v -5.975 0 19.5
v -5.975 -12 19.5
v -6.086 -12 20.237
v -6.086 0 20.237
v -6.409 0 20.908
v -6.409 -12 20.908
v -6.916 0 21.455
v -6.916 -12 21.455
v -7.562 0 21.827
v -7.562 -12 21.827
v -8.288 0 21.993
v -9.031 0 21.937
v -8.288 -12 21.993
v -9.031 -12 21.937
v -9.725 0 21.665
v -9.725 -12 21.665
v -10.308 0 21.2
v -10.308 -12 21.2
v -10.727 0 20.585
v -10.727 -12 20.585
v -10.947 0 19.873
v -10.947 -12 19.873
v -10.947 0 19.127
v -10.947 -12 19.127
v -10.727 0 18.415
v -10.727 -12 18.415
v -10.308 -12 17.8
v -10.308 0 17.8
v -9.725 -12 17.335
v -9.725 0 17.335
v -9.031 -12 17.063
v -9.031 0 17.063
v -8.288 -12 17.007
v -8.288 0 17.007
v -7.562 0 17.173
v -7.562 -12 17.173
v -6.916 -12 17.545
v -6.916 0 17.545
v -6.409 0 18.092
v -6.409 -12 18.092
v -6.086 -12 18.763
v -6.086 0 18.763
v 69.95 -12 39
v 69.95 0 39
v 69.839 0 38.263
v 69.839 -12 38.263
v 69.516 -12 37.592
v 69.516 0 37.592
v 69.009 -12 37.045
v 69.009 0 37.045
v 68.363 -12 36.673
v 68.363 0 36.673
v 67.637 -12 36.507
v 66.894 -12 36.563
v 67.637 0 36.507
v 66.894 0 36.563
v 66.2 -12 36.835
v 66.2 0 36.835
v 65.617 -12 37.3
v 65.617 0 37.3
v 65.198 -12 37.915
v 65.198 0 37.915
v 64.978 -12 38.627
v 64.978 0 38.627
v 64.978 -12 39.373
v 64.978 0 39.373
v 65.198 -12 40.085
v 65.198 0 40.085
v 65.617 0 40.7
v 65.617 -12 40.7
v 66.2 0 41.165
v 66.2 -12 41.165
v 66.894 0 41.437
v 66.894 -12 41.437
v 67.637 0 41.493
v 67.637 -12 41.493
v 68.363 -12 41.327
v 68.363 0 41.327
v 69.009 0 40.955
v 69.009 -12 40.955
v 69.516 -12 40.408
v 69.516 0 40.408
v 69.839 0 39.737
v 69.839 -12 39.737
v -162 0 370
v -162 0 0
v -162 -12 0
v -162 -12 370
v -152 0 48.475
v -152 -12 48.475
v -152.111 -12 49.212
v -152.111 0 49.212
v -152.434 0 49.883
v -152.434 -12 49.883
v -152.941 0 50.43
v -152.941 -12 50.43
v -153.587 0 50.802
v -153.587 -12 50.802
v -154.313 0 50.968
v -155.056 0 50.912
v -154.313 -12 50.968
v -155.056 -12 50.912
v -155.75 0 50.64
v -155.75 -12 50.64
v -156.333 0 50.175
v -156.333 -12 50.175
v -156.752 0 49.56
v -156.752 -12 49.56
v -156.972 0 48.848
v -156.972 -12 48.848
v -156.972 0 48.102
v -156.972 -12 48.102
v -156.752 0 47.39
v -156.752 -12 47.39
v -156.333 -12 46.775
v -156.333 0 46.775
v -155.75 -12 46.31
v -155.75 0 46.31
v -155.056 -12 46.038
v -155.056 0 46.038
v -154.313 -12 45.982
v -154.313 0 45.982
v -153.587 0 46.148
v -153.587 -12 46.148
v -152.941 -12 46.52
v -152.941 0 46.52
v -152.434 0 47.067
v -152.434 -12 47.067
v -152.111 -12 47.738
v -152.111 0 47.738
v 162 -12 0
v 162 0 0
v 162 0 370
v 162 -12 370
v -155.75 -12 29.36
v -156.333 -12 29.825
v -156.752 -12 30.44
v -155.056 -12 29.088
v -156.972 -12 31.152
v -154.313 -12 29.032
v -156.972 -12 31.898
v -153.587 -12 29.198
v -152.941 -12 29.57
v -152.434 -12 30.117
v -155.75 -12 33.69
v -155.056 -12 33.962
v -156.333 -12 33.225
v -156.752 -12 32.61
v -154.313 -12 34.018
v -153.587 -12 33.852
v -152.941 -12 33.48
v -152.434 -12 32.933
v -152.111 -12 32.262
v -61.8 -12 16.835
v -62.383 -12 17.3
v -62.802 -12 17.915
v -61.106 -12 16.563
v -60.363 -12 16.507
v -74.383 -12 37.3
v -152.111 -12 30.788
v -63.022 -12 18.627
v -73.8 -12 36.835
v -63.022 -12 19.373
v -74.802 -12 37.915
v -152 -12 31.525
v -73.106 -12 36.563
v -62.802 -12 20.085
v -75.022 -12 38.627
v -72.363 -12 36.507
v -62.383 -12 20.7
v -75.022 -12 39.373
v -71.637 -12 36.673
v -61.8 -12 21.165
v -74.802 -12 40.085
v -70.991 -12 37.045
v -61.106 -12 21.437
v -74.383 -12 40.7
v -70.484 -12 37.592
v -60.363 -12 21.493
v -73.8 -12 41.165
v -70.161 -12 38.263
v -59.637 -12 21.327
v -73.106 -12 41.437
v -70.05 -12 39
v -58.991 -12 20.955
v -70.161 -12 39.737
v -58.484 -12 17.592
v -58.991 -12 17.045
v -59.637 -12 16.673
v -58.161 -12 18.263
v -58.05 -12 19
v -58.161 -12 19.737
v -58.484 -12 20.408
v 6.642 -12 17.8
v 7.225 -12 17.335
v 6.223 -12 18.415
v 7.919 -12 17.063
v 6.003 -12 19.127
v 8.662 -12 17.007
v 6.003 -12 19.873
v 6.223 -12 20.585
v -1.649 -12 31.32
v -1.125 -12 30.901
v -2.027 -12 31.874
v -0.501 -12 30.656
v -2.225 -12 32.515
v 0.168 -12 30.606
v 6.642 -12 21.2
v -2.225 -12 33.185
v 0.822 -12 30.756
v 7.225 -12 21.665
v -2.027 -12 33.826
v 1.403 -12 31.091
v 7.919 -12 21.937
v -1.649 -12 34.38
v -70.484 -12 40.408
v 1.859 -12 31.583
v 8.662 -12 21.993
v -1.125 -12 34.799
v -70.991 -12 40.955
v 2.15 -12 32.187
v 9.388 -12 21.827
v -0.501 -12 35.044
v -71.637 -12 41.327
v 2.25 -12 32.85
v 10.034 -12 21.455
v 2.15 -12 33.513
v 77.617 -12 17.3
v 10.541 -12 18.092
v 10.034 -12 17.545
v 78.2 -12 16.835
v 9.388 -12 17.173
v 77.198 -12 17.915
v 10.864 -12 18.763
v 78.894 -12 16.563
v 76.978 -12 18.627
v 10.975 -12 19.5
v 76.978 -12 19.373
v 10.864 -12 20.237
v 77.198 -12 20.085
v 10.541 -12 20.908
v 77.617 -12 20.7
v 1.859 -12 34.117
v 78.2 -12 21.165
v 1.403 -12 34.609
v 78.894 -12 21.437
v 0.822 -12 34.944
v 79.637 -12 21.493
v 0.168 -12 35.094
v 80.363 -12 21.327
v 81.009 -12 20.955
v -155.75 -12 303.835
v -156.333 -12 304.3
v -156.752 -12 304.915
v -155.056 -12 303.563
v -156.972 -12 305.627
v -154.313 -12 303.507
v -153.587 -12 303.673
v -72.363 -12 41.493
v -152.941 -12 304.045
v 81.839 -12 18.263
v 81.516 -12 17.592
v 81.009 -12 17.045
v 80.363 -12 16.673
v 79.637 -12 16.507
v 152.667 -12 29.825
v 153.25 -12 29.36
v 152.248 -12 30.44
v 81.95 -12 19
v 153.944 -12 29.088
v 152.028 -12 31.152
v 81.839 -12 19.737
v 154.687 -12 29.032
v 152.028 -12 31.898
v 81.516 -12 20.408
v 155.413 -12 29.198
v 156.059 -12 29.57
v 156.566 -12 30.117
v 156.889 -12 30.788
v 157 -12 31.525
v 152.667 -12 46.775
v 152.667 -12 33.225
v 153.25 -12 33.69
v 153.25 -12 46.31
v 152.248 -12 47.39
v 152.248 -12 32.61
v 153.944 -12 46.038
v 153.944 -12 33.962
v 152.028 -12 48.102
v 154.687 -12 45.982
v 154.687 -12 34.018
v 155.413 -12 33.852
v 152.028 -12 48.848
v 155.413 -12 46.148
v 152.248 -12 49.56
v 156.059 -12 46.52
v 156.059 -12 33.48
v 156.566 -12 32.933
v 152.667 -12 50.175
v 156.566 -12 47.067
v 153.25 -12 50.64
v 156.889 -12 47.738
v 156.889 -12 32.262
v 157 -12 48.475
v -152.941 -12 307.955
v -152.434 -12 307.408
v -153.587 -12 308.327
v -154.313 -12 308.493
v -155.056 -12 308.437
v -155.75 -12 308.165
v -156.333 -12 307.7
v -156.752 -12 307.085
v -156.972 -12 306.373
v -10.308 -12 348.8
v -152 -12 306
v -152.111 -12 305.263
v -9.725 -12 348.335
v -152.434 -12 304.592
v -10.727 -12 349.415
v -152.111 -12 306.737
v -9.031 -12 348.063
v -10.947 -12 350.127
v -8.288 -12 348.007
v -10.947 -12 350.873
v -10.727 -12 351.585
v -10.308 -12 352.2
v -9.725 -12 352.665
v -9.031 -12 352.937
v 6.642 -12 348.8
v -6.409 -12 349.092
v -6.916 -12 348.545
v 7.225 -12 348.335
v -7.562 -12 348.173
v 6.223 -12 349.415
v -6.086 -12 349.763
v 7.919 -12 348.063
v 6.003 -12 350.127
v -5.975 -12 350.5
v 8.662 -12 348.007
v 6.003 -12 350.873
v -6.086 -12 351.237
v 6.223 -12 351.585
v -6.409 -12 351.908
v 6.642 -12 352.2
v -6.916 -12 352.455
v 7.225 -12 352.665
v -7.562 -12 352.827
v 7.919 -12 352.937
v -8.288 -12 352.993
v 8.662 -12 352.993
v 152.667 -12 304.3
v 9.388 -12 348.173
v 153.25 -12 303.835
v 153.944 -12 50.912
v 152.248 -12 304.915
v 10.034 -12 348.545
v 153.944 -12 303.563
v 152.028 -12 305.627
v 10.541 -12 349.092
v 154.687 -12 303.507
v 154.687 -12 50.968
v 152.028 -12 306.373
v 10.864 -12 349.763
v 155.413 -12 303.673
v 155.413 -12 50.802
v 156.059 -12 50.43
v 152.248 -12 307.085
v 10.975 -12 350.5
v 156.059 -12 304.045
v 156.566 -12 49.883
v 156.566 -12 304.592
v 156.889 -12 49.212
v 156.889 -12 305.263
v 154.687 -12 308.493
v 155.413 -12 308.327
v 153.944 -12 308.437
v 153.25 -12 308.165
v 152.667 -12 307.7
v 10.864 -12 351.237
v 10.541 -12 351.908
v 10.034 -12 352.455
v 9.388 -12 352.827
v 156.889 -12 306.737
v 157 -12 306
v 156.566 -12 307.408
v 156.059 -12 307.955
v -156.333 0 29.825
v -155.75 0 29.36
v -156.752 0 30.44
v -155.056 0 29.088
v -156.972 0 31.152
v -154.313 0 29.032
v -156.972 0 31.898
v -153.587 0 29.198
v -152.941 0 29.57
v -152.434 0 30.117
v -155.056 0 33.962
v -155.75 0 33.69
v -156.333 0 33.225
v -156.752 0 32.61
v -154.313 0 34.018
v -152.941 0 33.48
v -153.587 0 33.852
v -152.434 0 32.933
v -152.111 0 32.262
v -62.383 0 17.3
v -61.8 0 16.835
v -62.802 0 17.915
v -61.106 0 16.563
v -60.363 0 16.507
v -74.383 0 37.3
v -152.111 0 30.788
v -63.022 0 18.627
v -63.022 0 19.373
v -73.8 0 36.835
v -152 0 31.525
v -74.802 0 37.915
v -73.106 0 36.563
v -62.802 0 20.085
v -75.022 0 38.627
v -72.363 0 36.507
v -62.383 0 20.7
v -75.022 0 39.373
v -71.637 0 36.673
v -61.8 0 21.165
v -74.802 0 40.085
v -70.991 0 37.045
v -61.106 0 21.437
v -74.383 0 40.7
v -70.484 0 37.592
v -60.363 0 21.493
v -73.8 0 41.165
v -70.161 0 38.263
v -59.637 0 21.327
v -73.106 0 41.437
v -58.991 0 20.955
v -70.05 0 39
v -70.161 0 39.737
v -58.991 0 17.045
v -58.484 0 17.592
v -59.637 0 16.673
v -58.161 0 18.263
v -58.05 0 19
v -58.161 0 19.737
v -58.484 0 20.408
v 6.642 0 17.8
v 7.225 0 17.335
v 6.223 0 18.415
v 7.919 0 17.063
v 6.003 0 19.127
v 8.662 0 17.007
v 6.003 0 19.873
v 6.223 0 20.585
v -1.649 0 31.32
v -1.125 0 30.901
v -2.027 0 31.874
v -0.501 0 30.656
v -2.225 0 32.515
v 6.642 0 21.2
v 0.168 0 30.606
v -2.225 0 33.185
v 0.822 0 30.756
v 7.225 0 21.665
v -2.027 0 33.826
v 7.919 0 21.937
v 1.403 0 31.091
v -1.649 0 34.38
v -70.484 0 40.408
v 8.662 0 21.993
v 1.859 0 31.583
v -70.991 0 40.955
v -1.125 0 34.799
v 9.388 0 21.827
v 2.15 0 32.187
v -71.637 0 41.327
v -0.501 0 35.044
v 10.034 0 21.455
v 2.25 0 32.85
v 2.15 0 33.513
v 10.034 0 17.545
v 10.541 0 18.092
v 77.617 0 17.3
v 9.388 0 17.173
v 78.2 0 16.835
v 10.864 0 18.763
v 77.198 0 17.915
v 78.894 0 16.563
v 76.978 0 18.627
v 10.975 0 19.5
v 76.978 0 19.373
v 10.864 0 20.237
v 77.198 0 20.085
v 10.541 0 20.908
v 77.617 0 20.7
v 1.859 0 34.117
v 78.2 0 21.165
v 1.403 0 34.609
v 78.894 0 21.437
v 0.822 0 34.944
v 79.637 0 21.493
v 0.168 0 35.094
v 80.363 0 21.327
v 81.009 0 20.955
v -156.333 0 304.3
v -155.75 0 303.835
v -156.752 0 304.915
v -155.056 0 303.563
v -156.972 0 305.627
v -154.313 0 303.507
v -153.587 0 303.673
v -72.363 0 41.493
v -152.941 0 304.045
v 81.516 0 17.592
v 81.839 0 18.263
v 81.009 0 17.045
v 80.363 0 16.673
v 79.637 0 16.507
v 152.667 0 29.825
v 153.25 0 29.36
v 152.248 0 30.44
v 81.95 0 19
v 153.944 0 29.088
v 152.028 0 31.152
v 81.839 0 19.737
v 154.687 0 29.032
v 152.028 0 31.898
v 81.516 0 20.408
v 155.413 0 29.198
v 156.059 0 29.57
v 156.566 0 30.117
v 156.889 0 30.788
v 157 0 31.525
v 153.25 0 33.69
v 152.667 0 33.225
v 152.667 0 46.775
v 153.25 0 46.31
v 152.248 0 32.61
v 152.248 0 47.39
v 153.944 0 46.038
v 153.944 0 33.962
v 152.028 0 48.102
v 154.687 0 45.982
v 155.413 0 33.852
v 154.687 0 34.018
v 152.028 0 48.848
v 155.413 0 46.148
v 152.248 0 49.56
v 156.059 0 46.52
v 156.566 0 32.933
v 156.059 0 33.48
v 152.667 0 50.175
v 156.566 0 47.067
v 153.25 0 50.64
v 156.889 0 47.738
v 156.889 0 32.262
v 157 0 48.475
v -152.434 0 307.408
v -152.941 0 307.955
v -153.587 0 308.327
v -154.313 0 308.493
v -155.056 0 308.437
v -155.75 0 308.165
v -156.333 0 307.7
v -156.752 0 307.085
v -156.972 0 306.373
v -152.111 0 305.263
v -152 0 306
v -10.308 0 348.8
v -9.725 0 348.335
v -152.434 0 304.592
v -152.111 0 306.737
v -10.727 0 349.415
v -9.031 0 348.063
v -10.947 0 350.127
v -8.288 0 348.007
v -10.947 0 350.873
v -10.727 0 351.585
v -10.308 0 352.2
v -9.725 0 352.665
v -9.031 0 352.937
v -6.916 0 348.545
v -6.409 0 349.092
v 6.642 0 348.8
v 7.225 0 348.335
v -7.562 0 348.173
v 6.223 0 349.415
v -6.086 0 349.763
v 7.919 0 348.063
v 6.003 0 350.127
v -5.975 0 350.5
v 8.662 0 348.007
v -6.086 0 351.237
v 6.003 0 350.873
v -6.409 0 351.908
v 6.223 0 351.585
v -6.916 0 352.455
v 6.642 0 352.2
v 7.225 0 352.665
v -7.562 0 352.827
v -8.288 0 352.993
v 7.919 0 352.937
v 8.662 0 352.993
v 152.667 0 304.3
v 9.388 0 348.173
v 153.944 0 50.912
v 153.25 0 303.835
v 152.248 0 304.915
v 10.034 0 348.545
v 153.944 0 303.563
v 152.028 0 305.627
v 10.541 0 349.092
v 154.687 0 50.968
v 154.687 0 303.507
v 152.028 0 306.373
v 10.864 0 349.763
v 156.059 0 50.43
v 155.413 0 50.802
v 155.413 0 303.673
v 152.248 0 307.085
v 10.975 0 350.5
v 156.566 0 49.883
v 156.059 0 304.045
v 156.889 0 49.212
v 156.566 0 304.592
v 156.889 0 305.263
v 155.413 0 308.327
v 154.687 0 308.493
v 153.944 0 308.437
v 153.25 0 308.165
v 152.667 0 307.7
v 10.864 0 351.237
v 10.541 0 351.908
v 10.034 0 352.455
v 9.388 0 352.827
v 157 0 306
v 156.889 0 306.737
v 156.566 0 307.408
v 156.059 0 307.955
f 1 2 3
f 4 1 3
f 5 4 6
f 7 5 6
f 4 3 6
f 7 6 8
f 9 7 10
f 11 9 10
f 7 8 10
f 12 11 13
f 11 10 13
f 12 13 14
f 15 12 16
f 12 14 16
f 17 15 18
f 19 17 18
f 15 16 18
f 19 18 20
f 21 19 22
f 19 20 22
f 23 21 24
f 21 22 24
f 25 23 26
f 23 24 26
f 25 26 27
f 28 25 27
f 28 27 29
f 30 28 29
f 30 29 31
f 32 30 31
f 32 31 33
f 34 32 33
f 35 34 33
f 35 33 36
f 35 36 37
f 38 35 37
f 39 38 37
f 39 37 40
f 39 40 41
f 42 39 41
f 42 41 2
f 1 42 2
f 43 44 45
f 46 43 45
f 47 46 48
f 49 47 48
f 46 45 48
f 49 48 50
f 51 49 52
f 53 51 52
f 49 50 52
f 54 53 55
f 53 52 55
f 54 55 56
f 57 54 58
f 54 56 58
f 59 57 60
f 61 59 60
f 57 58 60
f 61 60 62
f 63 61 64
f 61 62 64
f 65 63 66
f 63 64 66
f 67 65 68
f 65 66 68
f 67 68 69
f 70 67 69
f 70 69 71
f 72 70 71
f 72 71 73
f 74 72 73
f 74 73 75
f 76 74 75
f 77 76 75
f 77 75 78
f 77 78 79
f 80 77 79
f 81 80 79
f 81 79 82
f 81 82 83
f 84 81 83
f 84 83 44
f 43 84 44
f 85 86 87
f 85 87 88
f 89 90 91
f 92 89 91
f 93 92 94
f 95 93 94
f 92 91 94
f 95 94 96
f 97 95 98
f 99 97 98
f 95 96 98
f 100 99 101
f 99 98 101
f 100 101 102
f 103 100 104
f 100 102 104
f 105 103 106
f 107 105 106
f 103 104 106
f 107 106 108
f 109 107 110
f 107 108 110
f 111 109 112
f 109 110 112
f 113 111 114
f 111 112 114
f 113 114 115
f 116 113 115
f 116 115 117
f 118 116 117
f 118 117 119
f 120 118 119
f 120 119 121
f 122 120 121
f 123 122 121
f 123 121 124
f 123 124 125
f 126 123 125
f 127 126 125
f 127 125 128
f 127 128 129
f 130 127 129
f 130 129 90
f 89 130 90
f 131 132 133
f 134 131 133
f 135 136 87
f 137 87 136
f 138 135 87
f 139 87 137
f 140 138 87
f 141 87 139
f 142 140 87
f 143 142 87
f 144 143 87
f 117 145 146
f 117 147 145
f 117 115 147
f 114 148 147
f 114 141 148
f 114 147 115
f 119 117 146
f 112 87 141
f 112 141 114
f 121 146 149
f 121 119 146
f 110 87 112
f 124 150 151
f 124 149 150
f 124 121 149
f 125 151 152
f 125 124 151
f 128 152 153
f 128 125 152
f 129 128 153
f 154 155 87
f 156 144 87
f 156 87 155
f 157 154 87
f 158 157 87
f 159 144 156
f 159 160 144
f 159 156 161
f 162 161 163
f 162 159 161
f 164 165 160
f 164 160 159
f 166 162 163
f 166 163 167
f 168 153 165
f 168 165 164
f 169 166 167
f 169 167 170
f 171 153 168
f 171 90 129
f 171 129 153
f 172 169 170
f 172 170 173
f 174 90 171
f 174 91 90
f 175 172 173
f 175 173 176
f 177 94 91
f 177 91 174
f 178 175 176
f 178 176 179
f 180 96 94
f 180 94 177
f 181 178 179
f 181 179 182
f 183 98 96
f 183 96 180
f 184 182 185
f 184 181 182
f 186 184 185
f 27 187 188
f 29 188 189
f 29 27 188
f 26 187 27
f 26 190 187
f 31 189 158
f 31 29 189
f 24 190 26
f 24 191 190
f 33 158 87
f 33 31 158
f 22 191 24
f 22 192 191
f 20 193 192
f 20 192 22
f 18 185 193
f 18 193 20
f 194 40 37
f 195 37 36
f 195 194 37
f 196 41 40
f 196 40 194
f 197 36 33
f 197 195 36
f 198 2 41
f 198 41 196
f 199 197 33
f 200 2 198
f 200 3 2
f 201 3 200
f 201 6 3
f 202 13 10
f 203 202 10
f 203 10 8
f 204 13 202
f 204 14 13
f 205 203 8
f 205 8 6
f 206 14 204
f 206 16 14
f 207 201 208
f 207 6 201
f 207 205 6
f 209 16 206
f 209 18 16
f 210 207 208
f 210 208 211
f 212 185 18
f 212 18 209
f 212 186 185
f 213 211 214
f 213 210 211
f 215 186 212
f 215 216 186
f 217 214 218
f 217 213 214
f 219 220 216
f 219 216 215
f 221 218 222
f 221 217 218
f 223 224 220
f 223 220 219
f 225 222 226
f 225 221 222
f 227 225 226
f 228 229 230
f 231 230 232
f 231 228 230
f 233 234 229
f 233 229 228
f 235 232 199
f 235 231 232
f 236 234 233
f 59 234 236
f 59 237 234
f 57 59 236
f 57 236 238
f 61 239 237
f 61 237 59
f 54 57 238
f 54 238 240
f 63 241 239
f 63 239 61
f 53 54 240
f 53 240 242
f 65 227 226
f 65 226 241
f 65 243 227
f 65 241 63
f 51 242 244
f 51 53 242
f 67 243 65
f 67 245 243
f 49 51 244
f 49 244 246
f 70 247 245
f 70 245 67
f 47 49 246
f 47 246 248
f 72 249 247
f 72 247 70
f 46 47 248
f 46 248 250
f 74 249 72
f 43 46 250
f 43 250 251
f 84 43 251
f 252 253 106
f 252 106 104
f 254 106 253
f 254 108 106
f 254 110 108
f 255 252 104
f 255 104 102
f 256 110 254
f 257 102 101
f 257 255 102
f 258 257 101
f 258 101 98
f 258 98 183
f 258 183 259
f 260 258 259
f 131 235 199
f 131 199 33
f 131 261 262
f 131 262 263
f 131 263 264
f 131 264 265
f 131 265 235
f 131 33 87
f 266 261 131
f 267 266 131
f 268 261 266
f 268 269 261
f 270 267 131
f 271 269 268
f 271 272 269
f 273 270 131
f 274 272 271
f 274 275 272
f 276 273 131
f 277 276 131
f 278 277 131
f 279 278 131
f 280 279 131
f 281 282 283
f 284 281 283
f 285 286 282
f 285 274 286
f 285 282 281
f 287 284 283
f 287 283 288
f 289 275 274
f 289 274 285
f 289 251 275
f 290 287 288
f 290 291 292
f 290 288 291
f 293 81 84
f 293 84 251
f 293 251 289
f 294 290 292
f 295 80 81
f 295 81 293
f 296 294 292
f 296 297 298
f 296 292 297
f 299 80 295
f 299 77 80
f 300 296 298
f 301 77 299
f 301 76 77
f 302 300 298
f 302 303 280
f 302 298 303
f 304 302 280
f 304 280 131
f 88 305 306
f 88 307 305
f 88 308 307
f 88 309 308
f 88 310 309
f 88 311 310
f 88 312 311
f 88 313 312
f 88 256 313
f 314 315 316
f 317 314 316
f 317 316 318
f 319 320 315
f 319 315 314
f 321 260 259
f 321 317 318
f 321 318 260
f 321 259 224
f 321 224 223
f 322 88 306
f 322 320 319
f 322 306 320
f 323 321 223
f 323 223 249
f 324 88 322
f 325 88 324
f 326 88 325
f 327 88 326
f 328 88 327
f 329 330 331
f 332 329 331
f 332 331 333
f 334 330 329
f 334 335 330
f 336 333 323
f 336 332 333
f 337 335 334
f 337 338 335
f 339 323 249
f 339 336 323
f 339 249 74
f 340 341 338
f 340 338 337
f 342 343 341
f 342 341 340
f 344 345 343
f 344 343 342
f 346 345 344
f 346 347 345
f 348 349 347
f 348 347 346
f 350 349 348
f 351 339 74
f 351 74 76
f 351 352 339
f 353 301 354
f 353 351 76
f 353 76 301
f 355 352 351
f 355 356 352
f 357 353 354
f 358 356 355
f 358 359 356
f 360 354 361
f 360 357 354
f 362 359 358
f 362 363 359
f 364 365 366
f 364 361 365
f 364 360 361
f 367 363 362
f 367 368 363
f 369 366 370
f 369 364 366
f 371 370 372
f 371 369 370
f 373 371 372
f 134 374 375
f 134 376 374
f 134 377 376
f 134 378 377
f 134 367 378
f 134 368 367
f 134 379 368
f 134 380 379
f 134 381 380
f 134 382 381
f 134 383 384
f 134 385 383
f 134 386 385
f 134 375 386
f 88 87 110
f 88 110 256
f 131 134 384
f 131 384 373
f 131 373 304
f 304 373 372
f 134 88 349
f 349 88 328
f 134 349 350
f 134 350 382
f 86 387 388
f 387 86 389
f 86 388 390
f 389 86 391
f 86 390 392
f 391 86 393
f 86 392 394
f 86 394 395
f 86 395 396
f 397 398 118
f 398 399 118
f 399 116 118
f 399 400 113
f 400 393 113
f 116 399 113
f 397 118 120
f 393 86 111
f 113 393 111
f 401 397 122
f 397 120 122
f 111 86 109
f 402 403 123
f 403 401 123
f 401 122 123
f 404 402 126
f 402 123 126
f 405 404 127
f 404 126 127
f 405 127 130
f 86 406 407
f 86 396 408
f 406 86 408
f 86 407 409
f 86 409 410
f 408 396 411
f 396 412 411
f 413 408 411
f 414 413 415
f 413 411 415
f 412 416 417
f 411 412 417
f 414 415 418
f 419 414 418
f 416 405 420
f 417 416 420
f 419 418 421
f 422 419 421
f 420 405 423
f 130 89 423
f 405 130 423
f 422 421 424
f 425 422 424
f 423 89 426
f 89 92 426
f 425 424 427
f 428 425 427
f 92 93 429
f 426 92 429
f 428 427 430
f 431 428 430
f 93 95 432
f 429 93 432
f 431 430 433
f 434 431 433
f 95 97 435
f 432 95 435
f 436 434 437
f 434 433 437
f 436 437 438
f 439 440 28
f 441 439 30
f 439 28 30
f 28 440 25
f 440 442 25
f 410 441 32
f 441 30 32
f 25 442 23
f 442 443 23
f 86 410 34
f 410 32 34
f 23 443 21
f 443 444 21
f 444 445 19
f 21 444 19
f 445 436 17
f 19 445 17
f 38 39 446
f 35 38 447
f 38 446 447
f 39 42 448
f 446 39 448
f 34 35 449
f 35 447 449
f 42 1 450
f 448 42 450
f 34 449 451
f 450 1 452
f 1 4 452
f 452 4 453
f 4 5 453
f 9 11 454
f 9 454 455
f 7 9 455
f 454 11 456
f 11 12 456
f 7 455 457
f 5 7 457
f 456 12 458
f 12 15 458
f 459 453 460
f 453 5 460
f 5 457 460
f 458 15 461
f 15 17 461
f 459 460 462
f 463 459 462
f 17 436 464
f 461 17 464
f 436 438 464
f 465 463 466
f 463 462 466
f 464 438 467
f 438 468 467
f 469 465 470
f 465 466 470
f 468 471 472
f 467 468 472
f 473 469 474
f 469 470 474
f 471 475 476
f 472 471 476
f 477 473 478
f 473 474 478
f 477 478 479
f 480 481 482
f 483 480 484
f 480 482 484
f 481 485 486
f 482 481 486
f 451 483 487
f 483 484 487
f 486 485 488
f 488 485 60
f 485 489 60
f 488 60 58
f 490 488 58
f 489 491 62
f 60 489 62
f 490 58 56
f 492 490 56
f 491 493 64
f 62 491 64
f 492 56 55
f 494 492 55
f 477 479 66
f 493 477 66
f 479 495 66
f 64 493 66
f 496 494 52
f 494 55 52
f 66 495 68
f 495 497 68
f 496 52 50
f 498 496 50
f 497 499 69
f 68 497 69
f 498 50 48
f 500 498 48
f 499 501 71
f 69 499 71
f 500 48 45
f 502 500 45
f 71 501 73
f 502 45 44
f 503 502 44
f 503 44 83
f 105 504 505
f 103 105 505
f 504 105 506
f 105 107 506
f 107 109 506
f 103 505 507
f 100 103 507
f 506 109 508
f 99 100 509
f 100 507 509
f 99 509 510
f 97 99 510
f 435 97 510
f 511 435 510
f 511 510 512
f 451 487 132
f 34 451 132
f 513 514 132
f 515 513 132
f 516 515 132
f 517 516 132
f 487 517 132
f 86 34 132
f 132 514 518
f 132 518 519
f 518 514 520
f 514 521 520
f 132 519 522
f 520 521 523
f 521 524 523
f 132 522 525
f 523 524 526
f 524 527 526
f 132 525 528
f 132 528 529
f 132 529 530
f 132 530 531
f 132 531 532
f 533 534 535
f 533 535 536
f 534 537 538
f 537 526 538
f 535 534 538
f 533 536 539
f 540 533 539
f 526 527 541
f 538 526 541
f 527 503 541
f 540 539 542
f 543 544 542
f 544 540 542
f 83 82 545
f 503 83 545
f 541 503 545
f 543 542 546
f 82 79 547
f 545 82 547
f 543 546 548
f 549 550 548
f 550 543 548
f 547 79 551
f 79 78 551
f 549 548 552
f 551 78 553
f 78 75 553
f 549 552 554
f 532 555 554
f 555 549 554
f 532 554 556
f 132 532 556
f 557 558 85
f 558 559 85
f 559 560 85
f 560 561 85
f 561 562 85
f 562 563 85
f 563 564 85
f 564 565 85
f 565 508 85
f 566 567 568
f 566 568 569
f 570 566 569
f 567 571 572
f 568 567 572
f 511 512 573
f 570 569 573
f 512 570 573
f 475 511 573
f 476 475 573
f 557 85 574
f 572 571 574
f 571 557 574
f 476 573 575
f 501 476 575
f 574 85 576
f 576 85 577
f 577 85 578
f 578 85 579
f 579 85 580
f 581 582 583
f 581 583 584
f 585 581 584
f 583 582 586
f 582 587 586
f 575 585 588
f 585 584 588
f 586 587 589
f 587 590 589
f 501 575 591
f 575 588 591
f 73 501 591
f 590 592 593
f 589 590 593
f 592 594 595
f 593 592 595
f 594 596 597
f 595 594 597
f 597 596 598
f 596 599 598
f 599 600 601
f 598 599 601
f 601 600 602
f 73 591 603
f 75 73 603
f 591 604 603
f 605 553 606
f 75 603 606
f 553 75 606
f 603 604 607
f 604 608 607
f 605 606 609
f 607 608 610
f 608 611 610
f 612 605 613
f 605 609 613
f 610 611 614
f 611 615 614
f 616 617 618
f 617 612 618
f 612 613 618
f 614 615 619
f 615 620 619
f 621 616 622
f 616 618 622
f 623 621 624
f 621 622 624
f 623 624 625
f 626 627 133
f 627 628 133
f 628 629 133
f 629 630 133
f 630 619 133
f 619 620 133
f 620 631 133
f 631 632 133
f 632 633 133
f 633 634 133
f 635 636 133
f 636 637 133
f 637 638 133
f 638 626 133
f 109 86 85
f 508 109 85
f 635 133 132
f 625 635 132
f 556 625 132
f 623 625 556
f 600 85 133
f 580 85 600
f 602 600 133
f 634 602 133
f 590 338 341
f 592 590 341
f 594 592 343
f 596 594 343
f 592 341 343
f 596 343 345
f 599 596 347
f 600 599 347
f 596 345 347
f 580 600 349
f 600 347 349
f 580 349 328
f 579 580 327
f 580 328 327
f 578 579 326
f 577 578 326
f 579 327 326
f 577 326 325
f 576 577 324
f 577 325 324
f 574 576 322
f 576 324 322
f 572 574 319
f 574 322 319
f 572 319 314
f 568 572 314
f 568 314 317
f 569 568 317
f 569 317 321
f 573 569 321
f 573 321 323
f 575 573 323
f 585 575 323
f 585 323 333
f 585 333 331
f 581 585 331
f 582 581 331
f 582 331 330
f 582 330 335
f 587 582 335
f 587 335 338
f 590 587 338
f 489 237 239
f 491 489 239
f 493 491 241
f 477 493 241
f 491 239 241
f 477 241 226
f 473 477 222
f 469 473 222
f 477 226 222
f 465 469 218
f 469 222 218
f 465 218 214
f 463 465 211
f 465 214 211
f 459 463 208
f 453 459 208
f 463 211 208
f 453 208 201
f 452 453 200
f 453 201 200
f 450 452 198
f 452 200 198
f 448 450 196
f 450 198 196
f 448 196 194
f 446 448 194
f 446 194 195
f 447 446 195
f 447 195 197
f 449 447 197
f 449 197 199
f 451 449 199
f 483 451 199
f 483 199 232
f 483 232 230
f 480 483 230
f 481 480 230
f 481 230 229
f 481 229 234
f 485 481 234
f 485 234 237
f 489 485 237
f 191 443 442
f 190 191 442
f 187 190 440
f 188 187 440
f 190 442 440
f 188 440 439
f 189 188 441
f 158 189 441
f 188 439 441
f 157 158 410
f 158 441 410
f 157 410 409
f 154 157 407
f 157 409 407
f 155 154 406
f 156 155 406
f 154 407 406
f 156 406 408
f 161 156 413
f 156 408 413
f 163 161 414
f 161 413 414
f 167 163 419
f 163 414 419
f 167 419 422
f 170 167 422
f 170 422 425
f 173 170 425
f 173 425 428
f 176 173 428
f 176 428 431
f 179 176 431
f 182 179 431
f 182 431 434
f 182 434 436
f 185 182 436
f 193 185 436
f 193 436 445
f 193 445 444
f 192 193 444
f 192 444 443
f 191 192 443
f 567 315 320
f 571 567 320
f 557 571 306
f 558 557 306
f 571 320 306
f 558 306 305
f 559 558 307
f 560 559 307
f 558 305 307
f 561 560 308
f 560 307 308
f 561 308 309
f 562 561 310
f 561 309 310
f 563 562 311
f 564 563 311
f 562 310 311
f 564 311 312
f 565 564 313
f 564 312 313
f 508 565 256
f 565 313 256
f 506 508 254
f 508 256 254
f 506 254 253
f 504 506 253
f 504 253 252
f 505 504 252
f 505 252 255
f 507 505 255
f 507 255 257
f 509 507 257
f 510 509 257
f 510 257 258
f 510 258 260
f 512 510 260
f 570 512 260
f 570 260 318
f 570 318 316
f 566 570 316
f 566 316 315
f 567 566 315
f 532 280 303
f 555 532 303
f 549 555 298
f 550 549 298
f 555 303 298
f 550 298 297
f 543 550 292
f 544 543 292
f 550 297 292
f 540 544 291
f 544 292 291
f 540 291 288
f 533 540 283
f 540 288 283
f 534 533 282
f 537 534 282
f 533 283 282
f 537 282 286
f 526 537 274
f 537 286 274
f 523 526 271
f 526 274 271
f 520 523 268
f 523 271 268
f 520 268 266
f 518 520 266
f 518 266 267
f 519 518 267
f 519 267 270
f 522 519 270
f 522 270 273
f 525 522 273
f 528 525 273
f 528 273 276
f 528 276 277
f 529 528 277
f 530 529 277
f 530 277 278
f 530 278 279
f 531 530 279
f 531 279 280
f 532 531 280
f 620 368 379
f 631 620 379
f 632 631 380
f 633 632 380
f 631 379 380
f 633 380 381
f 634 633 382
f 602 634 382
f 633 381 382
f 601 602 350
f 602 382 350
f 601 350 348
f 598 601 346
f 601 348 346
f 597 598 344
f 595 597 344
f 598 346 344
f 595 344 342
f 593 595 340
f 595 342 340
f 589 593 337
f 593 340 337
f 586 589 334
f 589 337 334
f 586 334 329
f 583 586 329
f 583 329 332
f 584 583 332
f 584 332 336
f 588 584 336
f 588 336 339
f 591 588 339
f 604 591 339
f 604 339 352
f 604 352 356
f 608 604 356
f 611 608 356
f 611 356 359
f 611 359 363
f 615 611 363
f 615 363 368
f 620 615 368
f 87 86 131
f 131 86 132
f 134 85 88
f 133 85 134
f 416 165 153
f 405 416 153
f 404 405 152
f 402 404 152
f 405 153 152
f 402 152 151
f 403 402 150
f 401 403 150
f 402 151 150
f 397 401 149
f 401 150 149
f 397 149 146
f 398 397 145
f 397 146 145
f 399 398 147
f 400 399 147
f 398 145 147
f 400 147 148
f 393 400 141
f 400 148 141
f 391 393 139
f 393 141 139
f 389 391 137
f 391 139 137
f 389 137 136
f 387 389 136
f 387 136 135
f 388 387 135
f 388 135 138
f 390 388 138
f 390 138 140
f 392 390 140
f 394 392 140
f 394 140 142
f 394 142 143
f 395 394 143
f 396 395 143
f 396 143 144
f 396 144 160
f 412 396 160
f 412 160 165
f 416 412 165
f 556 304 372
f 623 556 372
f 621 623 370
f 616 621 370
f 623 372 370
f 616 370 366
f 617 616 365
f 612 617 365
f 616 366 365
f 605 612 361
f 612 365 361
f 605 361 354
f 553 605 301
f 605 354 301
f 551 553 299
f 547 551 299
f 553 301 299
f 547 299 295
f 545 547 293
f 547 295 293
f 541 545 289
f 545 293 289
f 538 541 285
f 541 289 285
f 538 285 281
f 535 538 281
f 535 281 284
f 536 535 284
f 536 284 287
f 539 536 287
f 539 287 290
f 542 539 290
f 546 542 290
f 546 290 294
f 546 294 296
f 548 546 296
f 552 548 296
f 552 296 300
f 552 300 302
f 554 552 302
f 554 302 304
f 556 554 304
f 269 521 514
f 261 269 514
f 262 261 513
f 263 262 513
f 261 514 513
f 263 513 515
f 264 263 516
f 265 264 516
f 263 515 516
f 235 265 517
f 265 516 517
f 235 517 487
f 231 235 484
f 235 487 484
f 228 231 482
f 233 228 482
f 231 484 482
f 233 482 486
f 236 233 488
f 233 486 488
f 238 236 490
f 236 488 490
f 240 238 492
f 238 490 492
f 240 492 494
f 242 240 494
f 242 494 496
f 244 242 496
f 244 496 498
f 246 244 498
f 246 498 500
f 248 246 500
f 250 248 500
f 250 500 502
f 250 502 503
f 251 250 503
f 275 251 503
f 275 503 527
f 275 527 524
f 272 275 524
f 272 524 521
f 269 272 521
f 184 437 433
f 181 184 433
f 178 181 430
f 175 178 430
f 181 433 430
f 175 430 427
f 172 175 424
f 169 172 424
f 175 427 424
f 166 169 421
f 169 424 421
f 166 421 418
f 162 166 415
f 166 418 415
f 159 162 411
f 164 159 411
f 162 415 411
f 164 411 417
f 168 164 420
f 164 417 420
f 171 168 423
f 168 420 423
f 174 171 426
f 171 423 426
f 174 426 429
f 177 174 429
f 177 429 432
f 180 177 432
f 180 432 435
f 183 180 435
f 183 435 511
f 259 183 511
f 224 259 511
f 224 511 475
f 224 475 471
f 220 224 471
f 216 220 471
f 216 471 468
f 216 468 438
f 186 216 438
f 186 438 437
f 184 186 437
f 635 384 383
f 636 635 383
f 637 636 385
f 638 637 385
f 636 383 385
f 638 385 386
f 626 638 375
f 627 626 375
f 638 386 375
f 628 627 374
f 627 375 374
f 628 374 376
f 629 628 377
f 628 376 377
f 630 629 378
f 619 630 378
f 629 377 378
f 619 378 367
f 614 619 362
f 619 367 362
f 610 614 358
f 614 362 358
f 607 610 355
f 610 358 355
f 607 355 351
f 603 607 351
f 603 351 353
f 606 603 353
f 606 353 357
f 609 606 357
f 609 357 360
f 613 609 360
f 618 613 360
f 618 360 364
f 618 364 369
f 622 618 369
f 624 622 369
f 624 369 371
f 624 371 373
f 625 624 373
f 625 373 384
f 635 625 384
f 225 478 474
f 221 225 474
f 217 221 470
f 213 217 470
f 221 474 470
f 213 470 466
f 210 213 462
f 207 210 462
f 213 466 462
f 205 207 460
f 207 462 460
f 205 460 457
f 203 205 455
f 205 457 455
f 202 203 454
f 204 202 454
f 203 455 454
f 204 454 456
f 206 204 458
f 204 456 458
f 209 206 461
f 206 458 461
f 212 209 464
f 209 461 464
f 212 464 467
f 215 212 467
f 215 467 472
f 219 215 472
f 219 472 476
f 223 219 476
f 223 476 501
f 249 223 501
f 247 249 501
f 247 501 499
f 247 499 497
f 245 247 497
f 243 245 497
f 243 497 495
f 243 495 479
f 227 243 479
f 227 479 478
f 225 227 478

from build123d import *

# Parameters (mm, degrees)
SKETCH_W        = 324
SKETCH_H        = 370
PAD_DEPTH       = 12
SKETCH001_R     = 2.5
POCKET_DEPTH    = 12.001
SKETCH002_R     = 2.5
SKETCH002_R_2   = 2.25
POCKET001_DEPTH = 12.001


with BuildPart() as part:
    # Sketch → Pad (new body)
    with BuildSketch(Plane.XZ):
        with Locations((0, 185)):
            Rectangle(SKETCH_W, SKETCH_H)
    extrude(amount=PAD_DEPTH)

    # Sketch001 → Pocket (cut, through all)
    with BuildSketch(Plane.XZ.offset(12)):
        with Locations((-154.5, 31.525)):
            Circle(SKETCH001_R)
        with Locations((-154.5, 48.475)):
            Circle(SKETCH001_R)
        with Locations((-154.5, 306)):
            Circle(SKETCH001_R)
        with Locations((-8.475, 350.5)):
            Circle(SKETCH001_R)
        with Locations((8.475, 350.5)):
            Circle(SKETCH001_R)
        with Locations((154.5, 306)):
            Circle(SKETCH001_R)
        with Locations((154.5, 48.475)):
            Circle(SKETCH001_R)
        with Locations((154.5, 31.525)):
            Circle(SKETCH001_R)
        with Locations((8.475, 19.5)):
            Circle(SKETCH001_R)
        with Locations((-8.475, 19.5)):
            Circle(SKETCH001_R)
    extrude(amount=-POCKET_DEPTH, mode=Mode.SUBTRACT)

    # Sketch002 → Pocket001 (cut, through all)
    with BuildSketch(Plane(origin=(0, 0, 0), x_dir=(1, 0, 0), z_dir=(0, 1, 0))):
        with Locations((-72.55, -39)):
            Circle(SKETCH002_R)
        with Locations((-60.55, -19)):
            Circle(SKETCH002_R)
        with Locations((79.45, -19)):
            Circle(SKETCH002_R)
        with Locations((67.45, -39)):
            Circle(SKETCH002_R)
        with Locations((0, -32.85)):
            Circle(SKETCH002_R_2)
    extrude(amount=-POCKET001_DEPTH, mode=Mode.SUBTRACT)


solid = part.part
